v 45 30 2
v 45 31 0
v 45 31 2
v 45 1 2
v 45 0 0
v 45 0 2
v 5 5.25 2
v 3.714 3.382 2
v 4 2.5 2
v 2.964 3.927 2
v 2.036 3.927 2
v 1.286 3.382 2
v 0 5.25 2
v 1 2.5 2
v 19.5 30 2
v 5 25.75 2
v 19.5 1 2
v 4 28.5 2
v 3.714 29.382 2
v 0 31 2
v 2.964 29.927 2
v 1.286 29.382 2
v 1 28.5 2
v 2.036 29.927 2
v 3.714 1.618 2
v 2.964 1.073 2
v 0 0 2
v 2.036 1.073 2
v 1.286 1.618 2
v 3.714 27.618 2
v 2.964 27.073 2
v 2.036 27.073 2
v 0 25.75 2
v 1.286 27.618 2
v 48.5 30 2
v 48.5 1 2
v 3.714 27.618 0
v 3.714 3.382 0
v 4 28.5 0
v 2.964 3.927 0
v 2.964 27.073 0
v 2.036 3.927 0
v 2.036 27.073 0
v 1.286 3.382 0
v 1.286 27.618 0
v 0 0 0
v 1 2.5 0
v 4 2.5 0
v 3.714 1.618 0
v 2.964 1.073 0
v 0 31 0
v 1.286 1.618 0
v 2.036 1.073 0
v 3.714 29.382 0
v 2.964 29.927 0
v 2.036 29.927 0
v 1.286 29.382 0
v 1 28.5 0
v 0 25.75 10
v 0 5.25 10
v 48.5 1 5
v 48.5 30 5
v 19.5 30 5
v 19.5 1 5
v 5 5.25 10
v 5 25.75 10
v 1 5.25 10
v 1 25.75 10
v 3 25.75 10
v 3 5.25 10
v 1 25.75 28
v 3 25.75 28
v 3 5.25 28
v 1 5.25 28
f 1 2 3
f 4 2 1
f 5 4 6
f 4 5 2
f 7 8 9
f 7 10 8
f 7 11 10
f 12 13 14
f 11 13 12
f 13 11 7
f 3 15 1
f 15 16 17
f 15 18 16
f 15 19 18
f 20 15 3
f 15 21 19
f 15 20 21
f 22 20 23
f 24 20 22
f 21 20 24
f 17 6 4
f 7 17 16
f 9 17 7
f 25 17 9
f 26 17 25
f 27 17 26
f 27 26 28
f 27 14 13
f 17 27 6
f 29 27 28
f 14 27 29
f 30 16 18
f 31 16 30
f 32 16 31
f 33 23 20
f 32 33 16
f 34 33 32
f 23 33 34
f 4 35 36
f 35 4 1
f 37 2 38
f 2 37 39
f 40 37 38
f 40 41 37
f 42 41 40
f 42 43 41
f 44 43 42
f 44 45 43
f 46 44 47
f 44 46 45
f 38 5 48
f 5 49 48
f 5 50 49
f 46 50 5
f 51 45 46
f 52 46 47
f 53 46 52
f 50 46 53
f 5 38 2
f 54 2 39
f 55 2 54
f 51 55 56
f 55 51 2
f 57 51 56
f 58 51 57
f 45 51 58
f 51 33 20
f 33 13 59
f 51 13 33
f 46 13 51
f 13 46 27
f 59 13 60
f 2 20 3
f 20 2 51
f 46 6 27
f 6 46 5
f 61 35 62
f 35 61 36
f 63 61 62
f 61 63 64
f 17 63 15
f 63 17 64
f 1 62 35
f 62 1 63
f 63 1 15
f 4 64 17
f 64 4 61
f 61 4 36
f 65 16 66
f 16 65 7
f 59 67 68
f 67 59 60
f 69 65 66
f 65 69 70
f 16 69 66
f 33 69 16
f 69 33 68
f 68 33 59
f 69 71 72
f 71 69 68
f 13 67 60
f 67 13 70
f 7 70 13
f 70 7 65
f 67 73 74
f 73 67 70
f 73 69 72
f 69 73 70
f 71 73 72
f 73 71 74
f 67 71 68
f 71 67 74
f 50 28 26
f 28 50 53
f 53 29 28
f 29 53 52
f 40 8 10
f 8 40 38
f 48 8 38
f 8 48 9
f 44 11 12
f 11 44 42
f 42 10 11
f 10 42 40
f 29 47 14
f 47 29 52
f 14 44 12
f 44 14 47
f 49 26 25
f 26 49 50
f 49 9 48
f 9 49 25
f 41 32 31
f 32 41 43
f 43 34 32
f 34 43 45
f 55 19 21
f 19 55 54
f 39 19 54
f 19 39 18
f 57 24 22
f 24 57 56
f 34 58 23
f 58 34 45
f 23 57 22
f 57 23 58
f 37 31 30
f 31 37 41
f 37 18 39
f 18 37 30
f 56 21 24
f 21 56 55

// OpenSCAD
module sdCardReader()
{
  difference()
  {
    union()
    {
      // main board
      cube([45,31,2]);
      // card connector
      translate([45-29+3.5, (31-29)/2, 2])
        cube([29,29,3]);
      // connectors
      translate([0, (31-20.5)/2, 2])
        cube([5, 20.5, 8]);
      // plugs
      translate([1, (31-20.5)/2, 8+2])
        cube([2, 20.5, 18]);
    }
    for(offset = [
                   [3/2+1, 3/2+1, -1],
                   [3/2+1, 31-3/2-1, -1]
                 ])
    {
      translate(offset)
        cylinder(r=3/2, h=4, $fs=1);
    }
  }
}

sdCardReader();
